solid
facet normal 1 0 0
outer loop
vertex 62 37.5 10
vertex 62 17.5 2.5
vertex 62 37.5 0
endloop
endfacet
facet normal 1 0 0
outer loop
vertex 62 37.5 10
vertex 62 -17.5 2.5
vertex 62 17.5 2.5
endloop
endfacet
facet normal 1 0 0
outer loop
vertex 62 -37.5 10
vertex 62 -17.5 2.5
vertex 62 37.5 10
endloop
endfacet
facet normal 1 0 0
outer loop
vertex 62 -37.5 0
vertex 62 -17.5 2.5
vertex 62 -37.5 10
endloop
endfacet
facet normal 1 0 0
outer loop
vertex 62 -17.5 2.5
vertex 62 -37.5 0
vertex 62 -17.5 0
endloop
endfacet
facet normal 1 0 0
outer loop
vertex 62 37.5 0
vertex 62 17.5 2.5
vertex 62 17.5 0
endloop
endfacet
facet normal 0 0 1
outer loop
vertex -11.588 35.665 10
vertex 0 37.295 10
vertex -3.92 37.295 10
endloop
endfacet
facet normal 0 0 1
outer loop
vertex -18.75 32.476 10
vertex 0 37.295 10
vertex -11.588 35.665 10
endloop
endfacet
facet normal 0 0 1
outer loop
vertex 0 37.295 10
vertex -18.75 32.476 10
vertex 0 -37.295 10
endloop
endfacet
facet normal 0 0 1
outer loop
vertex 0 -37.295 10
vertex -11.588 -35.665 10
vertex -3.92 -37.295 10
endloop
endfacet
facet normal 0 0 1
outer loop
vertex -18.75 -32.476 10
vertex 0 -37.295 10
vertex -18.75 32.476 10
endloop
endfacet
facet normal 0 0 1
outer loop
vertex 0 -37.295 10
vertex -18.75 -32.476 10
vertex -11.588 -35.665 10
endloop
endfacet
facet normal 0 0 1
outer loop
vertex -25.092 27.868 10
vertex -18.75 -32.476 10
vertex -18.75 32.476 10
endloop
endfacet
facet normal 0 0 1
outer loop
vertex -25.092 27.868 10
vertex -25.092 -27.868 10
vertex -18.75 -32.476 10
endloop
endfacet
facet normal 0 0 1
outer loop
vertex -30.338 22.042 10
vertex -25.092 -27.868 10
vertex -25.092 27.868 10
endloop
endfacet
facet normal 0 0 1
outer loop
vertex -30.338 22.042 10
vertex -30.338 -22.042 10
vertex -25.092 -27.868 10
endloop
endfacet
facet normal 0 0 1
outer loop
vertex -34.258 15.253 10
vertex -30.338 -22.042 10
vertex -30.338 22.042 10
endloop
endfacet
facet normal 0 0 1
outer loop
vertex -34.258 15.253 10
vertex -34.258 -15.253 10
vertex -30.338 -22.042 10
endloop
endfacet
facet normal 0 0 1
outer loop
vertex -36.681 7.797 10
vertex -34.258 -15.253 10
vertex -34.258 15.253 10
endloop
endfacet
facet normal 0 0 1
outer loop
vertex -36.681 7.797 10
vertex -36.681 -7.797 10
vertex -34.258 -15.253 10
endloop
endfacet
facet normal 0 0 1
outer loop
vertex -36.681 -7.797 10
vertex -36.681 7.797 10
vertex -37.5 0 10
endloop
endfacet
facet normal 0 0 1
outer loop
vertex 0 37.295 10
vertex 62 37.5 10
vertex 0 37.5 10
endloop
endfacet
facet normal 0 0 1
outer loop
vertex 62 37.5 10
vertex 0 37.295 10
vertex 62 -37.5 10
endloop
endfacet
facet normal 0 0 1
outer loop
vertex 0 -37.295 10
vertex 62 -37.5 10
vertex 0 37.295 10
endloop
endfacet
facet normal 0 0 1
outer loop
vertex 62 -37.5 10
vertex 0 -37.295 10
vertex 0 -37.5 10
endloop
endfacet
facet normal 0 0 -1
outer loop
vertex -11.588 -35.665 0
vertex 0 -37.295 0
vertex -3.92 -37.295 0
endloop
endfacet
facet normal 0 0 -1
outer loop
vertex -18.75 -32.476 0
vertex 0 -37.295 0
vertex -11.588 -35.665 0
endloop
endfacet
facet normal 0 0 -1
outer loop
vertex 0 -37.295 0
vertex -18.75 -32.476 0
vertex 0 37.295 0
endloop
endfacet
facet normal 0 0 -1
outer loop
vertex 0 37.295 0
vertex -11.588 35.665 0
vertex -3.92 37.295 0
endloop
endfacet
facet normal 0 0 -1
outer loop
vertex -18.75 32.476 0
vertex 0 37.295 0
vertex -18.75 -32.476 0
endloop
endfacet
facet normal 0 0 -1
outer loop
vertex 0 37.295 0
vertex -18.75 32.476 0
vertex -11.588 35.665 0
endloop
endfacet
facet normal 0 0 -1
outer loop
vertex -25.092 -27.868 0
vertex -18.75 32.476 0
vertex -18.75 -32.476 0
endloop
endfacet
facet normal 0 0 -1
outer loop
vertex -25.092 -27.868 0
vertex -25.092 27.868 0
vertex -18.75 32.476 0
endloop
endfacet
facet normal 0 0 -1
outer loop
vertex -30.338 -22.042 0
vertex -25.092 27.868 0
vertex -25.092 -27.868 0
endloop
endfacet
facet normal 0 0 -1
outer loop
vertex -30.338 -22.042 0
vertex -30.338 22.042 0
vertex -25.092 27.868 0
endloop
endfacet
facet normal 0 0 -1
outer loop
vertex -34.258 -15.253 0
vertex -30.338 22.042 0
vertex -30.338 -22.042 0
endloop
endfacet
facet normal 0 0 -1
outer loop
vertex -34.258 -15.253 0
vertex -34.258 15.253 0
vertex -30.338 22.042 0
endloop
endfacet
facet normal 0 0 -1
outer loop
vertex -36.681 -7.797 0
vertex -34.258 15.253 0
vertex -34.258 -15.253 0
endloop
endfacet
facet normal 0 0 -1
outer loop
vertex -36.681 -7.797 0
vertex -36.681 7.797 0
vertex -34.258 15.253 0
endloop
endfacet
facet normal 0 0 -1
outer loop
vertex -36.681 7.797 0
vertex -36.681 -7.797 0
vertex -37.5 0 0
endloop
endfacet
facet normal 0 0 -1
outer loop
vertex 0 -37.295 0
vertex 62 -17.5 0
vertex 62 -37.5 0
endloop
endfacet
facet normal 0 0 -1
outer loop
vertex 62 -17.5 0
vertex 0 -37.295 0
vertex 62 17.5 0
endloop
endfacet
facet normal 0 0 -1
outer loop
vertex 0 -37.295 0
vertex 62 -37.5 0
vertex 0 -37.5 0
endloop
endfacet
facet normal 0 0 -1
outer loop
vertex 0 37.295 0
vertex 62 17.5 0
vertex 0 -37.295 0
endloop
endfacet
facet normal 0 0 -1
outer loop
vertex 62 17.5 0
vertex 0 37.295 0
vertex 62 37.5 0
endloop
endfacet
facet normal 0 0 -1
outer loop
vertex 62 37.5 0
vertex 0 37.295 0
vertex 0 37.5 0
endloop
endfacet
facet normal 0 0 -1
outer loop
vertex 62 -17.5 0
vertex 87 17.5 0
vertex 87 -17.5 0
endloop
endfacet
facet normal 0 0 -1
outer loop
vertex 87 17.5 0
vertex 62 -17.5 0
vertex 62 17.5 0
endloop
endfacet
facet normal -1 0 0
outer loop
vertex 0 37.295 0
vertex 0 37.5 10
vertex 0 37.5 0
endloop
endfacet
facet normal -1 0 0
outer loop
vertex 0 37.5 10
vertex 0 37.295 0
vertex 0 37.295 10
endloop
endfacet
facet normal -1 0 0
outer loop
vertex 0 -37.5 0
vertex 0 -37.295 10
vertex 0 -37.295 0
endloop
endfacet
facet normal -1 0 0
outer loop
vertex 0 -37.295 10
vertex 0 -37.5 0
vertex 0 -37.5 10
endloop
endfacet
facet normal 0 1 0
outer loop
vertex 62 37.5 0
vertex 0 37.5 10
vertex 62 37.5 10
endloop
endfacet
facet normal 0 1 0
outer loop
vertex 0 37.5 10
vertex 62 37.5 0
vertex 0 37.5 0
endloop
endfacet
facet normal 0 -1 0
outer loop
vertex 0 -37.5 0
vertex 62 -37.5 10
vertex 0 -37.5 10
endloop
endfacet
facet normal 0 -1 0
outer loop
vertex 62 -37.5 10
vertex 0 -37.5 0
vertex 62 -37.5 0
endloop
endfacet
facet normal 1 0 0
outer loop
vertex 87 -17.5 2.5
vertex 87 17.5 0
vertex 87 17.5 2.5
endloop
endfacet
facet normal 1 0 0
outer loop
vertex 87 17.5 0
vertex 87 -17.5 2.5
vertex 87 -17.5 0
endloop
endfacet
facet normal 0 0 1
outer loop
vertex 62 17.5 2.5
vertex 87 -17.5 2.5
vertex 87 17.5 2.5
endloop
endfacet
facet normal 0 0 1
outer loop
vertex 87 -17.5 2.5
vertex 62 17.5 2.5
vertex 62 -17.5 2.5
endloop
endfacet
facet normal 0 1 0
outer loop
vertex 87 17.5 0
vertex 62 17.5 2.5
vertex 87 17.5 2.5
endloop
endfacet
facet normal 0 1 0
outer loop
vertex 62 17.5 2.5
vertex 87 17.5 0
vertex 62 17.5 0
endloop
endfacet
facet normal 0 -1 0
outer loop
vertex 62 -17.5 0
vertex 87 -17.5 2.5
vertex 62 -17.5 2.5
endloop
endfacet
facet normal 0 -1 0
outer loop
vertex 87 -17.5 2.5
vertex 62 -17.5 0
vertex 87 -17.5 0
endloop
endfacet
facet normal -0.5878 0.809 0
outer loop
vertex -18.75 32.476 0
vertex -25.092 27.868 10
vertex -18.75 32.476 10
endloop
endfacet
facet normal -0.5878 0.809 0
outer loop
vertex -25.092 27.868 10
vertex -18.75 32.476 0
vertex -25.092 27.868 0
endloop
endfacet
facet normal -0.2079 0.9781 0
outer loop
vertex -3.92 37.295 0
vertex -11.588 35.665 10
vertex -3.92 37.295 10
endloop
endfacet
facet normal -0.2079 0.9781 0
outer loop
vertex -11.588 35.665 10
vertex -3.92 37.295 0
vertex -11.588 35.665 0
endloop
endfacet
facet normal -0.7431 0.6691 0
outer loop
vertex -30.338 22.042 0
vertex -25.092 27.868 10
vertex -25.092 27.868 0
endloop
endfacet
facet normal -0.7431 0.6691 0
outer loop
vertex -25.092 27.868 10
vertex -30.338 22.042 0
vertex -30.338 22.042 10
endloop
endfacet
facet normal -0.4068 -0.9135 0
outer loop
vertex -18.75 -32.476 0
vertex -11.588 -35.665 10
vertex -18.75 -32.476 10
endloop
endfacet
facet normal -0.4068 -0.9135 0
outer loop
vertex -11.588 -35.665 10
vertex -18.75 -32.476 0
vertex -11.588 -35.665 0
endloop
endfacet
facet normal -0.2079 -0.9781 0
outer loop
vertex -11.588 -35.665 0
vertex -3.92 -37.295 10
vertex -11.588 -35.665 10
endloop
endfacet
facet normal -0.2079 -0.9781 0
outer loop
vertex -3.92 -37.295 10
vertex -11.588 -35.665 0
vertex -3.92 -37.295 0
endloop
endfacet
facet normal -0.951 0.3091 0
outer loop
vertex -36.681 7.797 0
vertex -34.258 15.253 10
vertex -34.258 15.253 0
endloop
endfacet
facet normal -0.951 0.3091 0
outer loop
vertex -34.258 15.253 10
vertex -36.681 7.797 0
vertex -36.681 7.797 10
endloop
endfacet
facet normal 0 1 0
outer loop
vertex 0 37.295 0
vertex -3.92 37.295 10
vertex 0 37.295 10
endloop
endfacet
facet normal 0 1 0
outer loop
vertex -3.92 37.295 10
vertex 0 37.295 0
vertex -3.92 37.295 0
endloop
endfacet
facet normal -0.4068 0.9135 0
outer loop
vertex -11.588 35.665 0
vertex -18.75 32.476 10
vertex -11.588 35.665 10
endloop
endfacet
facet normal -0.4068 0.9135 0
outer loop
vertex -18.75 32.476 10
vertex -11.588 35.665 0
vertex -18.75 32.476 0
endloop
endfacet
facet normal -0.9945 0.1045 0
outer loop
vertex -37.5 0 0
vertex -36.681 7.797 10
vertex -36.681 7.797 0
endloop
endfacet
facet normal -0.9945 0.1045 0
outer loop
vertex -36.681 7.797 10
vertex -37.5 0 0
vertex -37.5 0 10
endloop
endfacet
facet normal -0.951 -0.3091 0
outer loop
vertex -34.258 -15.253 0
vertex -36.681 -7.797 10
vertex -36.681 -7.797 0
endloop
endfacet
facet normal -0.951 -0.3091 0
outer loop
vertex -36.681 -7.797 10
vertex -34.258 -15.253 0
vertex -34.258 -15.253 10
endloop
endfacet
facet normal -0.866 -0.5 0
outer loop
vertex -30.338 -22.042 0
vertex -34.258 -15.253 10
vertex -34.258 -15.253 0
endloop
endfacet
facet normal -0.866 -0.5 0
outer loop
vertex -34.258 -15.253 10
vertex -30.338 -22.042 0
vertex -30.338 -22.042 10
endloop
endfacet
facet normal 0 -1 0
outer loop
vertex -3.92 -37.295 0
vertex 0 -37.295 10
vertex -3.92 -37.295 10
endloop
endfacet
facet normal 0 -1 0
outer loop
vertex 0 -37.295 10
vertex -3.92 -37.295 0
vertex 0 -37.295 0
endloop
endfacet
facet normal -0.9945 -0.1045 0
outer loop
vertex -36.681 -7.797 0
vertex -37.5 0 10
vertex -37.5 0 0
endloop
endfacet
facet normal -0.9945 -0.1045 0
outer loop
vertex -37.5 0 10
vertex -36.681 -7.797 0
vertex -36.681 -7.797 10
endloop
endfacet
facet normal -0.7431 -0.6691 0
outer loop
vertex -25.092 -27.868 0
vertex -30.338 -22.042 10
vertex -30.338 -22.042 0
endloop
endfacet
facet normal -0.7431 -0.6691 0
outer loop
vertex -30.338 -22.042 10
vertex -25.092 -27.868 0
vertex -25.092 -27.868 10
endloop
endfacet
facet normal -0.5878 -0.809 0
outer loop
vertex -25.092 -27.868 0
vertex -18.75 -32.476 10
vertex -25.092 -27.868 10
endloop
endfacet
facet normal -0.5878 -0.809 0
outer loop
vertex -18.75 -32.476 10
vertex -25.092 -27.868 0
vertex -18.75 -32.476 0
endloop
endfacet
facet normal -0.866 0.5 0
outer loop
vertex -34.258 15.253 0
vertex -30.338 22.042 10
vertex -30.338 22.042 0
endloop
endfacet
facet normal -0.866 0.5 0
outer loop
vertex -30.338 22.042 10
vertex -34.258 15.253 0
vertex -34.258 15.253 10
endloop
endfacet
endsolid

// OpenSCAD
// Ewok ear formers

HEIGHT = 62;
WIDTH = 75;
DEPTH = 10;
POST_HEIGHT = 25;
POST_WIDTH = 35;
POST_DEPTH = 2.5;

// Visible ear
cylinder(r=WIDTH/2,h=10);
translate([0,-WIDTH/2,0]){
    cube([HEIGHT, WIDTH, DEPTH]);
    
    // Mounting Post
    translate([HEIGHT,(WIDTH/2)-(POST_WIDTH/2),0]){
        cube([POST_HEIGHT, POST_WIDTH, POST_DEPTH]);
    }
}
